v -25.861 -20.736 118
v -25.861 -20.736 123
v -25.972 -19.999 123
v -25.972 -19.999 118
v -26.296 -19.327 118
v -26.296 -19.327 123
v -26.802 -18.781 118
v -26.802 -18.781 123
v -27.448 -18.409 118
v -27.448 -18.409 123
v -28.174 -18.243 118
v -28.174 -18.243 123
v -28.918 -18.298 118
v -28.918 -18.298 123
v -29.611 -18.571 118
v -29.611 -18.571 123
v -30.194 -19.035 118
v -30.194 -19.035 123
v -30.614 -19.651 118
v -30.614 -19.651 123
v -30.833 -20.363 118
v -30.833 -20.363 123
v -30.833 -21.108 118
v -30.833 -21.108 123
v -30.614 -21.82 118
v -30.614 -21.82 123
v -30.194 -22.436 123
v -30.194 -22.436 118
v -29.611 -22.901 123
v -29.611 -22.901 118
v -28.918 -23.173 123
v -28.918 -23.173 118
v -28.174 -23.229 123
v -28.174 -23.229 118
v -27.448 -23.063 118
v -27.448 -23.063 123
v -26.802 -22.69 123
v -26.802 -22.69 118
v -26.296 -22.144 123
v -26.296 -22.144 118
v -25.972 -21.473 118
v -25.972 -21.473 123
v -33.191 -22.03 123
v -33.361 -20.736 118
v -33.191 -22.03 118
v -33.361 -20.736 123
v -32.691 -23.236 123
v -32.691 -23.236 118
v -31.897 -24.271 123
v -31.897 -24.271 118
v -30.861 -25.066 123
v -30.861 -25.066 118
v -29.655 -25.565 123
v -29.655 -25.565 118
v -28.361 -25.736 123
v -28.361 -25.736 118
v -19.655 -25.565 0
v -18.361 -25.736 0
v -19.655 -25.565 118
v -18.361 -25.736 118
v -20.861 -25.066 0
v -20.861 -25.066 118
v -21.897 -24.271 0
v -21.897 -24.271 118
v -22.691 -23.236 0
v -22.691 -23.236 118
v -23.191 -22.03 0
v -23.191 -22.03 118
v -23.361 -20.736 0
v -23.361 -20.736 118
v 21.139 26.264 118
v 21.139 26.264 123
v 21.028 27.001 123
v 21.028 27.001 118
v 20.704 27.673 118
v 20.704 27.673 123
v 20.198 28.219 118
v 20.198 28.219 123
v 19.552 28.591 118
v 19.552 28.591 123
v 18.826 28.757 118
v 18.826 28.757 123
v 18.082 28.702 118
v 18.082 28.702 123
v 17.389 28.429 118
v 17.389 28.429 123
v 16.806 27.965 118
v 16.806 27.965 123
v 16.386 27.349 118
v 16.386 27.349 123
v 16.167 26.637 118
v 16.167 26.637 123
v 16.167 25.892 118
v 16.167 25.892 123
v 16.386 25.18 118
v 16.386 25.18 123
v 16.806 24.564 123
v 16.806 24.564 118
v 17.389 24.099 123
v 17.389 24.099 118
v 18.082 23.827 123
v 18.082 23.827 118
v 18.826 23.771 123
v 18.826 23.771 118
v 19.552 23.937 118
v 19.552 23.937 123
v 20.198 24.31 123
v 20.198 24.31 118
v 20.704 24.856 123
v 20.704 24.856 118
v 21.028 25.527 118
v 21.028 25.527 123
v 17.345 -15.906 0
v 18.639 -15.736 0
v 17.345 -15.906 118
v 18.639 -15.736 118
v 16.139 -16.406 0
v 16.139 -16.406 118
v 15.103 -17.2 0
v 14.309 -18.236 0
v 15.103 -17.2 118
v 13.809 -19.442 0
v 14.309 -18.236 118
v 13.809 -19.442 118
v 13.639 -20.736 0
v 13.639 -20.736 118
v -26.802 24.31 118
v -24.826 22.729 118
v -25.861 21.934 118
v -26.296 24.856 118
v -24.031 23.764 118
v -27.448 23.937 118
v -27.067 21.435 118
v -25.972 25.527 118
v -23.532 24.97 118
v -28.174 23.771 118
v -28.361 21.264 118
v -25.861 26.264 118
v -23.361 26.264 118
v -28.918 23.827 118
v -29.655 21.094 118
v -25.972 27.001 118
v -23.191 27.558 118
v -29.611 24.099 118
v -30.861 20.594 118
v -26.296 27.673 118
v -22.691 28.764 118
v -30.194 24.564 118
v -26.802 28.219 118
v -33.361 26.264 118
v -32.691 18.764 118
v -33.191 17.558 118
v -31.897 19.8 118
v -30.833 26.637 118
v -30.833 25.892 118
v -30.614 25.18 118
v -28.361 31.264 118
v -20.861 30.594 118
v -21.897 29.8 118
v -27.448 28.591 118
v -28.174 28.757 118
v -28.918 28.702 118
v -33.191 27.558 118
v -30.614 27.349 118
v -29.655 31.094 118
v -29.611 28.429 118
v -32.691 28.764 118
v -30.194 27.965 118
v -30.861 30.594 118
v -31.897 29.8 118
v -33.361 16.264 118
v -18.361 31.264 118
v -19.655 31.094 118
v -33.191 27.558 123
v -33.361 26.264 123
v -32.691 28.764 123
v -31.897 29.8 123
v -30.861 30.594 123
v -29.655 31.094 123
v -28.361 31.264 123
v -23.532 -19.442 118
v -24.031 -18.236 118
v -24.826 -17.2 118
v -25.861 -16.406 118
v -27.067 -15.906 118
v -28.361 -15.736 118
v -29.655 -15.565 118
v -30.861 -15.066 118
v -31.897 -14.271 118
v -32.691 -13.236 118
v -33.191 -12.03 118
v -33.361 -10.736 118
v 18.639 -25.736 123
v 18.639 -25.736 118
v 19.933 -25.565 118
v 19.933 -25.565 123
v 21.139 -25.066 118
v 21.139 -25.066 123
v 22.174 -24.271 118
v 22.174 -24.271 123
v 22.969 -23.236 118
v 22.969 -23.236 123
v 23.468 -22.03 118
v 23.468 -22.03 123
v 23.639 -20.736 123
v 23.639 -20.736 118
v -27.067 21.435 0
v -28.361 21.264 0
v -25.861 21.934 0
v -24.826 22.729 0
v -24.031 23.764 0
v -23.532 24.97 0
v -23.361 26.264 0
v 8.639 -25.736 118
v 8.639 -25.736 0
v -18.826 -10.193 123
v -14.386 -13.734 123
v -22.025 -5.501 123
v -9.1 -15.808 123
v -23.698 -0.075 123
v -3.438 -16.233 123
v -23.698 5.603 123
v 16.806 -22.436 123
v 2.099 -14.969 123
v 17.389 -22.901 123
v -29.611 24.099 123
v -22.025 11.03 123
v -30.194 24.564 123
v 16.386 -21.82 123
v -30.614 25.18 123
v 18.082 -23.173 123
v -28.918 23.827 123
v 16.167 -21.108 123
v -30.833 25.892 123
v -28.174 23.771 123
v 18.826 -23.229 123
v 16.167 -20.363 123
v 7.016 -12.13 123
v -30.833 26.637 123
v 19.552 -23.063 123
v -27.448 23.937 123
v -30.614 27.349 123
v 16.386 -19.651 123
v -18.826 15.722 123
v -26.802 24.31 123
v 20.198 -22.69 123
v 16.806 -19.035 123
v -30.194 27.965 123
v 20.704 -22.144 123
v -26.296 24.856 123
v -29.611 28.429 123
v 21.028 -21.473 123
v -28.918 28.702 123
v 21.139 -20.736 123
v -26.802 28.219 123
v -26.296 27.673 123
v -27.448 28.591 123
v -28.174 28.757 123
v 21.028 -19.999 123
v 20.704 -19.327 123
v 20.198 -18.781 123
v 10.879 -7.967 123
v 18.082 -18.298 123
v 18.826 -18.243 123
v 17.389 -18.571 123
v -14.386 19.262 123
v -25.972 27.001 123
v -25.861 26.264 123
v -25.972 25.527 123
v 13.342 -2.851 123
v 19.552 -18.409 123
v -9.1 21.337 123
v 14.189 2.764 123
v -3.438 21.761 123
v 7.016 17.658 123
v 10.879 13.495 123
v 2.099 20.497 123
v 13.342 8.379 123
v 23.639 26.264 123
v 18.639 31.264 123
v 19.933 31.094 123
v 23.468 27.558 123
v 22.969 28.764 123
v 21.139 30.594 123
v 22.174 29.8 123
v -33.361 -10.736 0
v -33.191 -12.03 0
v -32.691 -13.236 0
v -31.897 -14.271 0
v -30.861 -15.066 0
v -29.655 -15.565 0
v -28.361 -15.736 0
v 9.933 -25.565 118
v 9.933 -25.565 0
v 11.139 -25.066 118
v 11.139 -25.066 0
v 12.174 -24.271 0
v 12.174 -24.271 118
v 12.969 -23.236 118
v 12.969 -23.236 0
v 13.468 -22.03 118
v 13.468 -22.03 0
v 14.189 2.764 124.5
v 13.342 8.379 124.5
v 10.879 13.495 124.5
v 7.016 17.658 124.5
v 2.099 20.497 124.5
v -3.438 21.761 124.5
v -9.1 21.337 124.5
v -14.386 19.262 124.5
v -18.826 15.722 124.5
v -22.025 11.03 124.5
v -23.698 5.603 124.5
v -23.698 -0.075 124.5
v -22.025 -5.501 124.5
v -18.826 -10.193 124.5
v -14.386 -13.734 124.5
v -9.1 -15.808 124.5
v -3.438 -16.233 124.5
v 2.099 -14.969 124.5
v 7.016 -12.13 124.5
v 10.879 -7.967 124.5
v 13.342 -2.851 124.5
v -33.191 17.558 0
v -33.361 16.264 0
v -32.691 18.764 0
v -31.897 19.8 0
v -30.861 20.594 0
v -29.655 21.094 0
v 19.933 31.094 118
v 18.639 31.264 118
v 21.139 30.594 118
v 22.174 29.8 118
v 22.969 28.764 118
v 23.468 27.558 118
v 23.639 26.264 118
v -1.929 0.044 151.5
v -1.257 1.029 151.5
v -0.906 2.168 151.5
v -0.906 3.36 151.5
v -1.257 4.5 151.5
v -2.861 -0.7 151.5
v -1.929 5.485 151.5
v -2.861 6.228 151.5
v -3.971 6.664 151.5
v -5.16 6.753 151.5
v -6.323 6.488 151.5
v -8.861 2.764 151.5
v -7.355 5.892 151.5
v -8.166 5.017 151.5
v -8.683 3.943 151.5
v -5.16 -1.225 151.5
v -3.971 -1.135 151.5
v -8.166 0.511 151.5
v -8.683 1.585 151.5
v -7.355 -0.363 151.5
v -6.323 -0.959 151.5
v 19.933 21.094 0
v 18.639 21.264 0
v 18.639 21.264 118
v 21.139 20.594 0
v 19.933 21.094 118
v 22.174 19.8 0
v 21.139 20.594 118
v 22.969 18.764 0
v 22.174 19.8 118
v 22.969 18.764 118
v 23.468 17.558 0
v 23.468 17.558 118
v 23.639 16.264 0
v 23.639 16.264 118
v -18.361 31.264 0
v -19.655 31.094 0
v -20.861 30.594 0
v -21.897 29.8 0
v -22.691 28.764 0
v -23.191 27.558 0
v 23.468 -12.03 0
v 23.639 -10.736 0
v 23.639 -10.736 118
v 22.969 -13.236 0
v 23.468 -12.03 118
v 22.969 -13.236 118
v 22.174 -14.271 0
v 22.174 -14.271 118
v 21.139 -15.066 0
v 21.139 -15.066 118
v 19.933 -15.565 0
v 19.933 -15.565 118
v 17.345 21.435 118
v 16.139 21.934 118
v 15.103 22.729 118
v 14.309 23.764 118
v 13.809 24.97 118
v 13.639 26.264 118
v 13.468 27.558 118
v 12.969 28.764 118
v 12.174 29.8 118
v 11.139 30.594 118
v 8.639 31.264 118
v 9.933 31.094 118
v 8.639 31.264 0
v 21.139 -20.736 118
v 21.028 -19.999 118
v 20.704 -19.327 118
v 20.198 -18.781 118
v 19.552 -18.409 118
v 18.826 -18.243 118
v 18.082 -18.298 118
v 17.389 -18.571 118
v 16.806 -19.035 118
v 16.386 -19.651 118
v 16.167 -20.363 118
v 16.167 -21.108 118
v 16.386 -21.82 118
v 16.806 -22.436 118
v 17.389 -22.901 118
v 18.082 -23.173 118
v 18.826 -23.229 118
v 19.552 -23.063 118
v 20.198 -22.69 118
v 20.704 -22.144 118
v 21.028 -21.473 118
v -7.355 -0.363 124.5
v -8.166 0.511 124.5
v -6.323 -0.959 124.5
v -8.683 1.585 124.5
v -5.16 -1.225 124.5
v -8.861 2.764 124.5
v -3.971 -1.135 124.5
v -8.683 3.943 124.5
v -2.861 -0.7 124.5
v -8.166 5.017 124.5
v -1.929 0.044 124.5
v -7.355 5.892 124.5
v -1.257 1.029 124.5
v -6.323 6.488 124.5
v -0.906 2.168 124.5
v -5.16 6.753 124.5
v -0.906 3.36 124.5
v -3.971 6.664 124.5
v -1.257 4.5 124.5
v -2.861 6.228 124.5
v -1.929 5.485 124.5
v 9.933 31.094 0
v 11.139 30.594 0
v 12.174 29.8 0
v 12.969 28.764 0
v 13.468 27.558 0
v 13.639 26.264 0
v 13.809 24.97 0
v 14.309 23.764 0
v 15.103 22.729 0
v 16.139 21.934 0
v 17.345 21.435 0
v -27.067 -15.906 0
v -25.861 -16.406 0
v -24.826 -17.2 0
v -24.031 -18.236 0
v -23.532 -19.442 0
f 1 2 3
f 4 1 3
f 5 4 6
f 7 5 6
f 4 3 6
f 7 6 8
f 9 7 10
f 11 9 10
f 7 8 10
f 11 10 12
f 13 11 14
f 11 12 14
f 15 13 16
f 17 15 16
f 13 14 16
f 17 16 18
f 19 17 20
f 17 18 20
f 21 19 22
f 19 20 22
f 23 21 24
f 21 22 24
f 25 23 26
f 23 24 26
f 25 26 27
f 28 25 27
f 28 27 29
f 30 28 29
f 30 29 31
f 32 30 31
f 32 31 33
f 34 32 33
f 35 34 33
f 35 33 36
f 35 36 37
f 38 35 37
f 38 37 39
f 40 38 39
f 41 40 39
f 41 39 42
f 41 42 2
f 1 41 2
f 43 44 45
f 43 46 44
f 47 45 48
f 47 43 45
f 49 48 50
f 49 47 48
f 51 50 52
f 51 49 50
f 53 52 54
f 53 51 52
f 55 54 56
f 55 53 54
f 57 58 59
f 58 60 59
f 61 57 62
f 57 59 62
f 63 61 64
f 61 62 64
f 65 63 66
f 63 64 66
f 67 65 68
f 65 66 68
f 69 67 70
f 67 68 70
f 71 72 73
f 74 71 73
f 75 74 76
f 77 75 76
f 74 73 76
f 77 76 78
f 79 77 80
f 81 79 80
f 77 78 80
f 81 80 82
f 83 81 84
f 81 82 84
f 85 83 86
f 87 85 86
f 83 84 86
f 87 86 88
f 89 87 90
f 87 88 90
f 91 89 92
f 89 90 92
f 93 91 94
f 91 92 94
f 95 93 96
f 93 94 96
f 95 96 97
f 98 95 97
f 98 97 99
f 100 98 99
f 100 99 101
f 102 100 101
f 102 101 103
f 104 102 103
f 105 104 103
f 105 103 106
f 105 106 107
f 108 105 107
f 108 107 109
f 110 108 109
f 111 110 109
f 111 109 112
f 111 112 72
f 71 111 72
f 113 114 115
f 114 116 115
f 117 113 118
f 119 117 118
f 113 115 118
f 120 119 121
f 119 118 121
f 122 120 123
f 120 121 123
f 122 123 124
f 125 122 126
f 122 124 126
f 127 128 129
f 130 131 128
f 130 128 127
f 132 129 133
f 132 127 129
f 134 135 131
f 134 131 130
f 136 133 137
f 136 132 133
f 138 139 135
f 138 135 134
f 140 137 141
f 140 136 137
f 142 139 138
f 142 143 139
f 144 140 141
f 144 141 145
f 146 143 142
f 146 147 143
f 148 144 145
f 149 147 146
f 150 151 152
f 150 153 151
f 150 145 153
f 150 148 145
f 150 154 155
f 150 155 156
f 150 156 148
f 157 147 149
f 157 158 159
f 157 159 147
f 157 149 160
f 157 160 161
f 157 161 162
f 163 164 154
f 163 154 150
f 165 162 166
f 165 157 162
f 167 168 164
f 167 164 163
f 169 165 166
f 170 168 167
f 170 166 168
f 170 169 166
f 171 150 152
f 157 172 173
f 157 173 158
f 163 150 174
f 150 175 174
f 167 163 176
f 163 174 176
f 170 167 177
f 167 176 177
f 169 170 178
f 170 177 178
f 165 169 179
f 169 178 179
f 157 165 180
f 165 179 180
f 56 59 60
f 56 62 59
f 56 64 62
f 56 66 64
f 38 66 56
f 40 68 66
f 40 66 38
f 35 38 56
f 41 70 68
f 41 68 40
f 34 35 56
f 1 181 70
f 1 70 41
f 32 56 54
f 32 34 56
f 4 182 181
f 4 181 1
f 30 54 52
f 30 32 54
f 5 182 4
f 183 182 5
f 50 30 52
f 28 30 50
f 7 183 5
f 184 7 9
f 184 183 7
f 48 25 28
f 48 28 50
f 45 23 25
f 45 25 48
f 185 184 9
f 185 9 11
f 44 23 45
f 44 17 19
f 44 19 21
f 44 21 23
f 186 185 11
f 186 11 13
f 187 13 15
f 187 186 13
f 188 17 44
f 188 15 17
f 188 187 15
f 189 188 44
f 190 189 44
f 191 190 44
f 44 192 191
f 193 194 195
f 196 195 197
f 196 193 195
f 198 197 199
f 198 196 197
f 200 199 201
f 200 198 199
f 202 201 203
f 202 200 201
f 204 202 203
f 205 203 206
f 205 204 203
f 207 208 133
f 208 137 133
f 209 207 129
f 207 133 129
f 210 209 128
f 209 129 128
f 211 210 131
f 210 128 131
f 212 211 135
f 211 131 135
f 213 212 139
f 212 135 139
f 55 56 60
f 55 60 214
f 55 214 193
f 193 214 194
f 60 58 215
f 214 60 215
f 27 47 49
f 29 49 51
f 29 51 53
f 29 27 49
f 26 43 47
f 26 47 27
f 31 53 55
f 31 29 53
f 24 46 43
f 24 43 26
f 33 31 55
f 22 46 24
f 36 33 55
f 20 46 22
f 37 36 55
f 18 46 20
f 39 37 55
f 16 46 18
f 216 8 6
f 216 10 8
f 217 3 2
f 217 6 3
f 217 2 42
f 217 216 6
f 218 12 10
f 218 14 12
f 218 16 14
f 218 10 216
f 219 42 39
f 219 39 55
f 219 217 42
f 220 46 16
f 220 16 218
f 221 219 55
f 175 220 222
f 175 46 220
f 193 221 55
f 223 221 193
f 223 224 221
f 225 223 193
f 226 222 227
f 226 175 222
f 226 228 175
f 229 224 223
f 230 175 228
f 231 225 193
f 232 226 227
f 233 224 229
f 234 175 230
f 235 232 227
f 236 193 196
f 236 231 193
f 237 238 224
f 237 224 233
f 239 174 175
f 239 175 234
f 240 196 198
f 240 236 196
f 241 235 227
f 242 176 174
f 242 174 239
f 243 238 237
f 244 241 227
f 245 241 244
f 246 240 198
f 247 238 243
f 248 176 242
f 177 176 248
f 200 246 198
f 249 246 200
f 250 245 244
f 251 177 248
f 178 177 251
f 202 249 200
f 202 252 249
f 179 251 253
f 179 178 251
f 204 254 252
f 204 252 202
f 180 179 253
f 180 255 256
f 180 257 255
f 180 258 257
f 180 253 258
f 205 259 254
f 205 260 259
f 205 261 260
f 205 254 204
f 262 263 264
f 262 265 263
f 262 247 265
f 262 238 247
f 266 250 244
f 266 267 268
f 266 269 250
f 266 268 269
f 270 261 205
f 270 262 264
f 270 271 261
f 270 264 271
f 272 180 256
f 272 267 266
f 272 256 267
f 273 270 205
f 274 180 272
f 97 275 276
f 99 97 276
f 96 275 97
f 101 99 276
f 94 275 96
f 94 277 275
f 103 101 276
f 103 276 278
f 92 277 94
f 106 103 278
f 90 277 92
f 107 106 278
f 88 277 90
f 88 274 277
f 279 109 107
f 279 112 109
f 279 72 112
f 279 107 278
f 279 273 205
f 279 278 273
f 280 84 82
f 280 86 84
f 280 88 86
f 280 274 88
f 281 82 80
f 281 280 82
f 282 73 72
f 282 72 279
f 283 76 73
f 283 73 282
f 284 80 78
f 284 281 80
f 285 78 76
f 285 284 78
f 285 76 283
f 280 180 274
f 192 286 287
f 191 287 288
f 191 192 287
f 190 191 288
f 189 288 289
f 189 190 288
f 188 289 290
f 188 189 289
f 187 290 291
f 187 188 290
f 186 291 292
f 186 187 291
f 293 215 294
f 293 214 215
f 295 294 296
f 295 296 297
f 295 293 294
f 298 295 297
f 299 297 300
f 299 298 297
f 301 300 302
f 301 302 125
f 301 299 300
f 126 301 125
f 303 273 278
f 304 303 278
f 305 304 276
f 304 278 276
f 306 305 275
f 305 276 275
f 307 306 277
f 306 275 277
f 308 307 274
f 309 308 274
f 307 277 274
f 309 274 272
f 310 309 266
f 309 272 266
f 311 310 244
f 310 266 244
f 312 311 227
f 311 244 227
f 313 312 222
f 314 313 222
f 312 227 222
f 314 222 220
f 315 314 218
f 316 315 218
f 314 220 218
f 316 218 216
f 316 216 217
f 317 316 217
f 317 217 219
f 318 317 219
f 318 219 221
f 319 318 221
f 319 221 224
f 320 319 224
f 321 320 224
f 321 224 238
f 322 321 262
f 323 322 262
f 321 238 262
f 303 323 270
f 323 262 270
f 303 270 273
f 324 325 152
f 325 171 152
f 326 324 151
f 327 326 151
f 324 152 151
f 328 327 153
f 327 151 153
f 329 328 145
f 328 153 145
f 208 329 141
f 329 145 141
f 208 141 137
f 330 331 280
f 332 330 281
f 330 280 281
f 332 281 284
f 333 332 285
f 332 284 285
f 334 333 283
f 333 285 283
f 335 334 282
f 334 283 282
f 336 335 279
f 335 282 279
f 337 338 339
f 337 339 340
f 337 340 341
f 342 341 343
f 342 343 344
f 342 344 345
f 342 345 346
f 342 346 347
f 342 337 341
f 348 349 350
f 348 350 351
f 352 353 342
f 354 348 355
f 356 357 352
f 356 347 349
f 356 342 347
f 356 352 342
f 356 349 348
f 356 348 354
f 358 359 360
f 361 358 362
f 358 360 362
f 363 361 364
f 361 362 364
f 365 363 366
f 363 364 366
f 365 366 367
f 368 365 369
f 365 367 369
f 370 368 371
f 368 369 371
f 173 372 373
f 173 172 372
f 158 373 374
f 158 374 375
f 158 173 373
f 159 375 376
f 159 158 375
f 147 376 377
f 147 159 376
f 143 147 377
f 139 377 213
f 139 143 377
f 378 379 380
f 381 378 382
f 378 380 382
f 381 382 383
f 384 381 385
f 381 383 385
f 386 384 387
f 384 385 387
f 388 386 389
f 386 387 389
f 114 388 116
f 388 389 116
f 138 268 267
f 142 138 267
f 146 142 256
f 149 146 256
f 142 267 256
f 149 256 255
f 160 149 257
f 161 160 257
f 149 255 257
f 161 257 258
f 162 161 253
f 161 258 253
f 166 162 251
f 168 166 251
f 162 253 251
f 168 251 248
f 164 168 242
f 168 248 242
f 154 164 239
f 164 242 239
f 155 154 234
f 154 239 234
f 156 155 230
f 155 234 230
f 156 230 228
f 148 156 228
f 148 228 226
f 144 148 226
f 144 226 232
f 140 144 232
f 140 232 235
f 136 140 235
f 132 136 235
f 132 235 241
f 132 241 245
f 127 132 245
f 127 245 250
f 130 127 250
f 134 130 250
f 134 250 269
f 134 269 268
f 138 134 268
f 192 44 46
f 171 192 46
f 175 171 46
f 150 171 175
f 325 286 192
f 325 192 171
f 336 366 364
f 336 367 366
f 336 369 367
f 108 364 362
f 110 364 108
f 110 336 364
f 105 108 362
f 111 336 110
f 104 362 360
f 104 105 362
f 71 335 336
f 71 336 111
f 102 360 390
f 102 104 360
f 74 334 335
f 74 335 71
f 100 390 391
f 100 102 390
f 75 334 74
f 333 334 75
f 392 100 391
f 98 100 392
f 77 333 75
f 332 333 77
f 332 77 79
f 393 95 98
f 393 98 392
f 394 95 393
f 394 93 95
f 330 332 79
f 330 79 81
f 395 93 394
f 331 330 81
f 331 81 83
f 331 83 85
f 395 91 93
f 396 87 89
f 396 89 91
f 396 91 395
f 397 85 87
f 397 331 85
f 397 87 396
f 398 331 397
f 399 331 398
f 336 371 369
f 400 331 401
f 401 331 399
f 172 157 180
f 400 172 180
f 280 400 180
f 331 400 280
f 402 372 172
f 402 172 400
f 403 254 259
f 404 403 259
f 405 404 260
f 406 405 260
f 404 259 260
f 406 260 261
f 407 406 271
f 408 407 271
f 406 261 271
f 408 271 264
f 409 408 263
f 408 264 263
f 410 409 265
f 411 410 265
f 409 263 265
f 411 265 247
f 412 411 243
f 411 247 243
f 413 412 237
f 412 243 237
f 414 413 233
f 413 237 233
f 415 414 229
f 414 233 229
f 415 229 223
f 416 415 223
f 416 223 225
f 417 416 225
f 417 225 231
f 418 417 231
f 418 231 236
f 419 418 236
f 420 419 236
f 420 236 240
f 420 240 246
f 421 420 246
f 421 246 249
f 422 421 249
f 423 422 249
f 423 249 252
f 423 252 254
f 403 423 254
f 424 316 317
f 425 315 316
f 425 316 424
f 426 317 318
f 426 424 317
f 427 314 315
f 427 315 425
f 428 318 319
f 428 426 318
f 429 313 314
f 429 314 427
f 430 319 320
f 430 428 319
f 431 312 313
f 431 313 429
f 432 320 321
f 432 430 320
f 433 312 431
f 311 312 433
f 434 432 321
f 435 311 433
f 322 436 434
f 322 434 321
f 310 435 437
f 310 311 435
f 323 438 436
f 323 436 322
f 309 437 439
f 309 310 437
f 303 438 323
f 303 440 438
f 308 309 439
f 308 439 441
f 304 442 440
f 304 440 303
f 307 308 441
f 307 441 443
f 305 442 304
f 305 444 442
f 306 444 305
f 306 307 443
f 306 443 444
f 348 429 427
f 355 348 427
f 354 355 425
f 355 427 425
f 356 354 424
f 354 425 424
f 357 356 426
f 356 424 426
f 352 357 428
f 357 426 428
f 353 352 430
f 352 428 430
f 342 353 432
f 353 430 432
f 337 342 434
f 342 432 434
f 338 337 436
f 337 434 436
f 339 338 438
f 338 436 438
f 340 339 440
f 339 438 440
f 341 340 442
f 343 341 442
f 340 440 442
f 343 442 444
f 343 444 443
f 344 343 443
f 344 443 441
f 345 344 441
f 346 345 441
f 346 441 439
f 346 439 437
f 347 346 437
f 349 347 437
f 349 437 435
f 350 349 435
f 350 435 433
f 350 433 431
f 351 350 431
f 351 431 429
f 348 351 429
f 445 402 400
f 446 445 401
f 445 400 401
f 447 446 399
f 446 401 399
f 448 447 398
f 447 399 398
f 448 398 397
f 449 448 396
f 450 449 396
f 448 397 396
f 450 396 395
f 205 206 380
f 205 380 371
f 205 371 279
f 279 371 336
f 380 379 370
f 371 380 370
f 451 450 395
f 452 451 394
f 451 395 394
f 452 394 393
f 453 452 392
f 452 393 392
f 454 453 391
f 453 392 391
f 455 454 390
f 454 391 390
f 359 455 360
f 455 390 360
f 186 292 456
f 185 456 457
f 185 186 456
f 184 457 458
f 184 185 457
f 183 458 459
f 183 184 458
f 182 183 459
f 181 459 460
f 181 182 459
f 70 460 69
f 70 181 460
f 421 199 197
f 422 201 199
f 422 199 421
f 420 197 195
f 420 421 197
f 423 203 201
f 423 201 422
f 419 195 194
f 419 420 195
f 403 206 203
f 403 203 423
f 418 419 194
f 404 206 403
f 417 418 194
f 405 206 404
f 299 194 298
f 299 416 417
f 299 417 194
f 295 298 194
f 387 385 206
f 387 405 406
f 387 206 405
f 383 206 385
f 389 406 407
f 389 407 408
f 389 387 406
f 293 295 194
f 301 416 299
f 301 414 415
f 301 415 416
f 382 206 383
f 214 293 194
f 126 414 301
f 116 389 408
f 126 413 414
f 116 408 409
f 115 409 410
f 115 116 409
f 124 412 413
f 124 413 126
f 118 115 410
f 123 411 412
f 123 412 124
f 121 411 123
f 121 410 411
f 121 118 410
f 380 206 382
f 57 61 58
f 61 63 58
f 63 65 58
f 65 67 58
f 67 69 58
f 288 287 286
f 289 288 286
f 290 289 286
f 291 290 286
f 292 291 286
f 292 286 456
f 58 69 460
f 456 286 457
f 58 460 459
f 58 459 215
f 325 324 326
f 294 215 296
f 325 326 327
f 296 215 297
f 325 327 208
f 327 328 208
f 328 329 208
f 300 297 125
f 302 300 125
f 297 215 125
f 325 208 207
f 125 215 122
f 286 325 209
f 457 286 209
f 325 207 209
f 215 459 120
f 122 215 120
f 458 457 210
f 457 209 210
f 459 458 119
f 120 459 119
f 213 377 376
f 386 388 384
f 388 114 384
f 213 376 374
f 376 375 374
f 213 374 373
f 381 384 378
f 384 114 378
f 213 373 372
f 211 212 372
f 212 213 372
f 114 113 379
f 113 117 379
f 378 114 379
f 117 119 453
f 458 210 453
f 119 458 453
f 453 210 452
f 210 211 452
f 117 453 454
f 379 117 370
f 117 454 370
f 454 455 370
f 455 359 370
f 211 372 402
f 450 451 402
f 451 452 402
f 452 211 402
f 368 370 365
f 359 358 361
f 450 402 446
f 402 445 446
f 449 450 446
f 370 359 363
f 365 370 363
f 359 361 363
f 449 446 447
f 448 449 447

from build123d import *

# Parameters (mm, degrees)
SKETCH1_W            = 57
SKETCH1_H            = 57
BOSS_EXTRUDE1_DEPTH  = 123
SKETCH2_W            = 10
SKETCH2_H            = 10
CUT_EXTRUDE1_DEPTH   = 118
LPATTERN1_COUNT      = 2
LPATTERN1_PITCH      = 47
LPATTERN1_COUNT_DIR2 = 2
LPATTERN1_PITCH_DIR2 = 47
SKETCH3_R            = 2.5
CUT_EXTRUDE2_DEPTH   = 50
LPATTERN2_COUNT      = 2
LPATTERN2_PITCH      = 47
LPATTERN2_COUNT_DIR2 = 2
LPATTERN2_PITCH_DIR2 = 47
FILLET1_R            = 5
SKETCH5_R            = 19.05
BOSS_EXTRUDE3_DEPTH  = 1.5
SKETCH4_R            = 4
BOSS_EXTRUDE2_DEPTH  = 28.5


with BuildPart() as part:
    # Sketch1 → Boss-Extrude1 (new body)
    with BuildSketch(Plane.XY):
        with Locations((-4.861204013, 2.764214047)):
            Rectangle(SKETCH1_W, SKETCH1_H)
    extrude(amount=BOSS_EXTRUDE1_DEPTH)

    # Sketch2 → Cut-Extrude1 (cut)
    with BuildSketch(Plane(origin=(0, 0, 0), x_dir=(-1, 0, 0), z_dir=(0, 0, -1))):
        with Locations((-18.638795987, 26.264214047)):
            Rectangle(SKETCH2_W, SKETCH2_H)
    cut_extrude1 = extrude(amount=-CUT_EXTRUDE1_DEPTH, mode=Mode.SUBTRACT)

    # LPattern1: Cut-Extrude1 2 × 2
    with Locations(*[(-i * LPATTERN1_PITCH, -j * LPATTERN1_PITCH_DIR2, 0) for i in range(LPATTERN1_COUNT) for j in range(LPATTERN1_COUNT_DIR2) if (i, j) != (0, 0)]):
        add(cut_extrude1, mode=Mode.SUBTRACT)

    # Sketch3 → Cut-Extrude2 (cut)
    with BuildSketch(Plane.XY.offset(123)):
        with Locations((-28.361204013, 26.264214047)):
            Circle(SKETCH3_R)
    cut_extrude2 = extrude(amount=-CUT_EXTRUDE2_DEPTH, mode=Mode.SUBTRACT)

    # LPattern2: Cut-Extrude2 2 × 2
    with Locations(*[(i * LPATTERN2_PITCH, -j * LPATTERN2_PITCH_DIR2, 0) for i in range(LPATTERN2_COUNT) for j in range(LPATTERN2_COUNT_DIR2) if (i, j) != (0, 0)]):
        add(cut_extrude2, mode=Mode.SUBTRACT)

    # Fillet1
    fillet1_edges = [part.edges().sort_by_distance(p)[0] for p in [
        (-33.361204013, 21.264214047, 59),
        (-23.361204013, 21.264214047, 59),
        (-23.361204013, 31.264214047, 59),
        (13.638795987, 31.264214047, 59),
        (13.638795987, 21.264214047, 59),
        (23.638795987, 21.264214047, 59),
        (23.638795987, -25.735785953, 120.5),
        (23.638795987, -15.735785953, 59),
        (13.638795987, -15.735785953, 59),
        (13.638795987, -25.735785953, 59),
        (-23.361204013, -25.735785953, 59),
        (-23.361204013, -15.735785953, 59),
        (-33.361204013, -15.735785953, 59),
        (-33.361204013, -25.735785953, 120.5),
        (-33.361204013, 31.264214047, 120.5),
        (23.638795987, 31.264214047, 120.5),
    ]]
    fillet(fillet1_edges, radius=FILLET1_R - 0.0001)  # a hair under: the kernel refuses the full size

    # Sketch5 → Boss-Extrude3 (add)
    with BuildSketch(Plane.XY.offset(123)):
        with Locations((-4.861204013, 2.764214047)):
            Circle(SKETCH5_R)
    extrude(amount=BOSS_EXTRUDE3_DEPTH)

    # Sketch4 → Boss-Extrude2 (add)
    with BuildSketch(Plane.XY.offset(123)):
        with Locations(Location((-4.861204013, 2.764214047, 0), (0, 0, 180))):
            Circle(SKETCH4_R)
    extrude(amount=BOSS_EXTRUDE2_DEPTH)


solid = part.part
